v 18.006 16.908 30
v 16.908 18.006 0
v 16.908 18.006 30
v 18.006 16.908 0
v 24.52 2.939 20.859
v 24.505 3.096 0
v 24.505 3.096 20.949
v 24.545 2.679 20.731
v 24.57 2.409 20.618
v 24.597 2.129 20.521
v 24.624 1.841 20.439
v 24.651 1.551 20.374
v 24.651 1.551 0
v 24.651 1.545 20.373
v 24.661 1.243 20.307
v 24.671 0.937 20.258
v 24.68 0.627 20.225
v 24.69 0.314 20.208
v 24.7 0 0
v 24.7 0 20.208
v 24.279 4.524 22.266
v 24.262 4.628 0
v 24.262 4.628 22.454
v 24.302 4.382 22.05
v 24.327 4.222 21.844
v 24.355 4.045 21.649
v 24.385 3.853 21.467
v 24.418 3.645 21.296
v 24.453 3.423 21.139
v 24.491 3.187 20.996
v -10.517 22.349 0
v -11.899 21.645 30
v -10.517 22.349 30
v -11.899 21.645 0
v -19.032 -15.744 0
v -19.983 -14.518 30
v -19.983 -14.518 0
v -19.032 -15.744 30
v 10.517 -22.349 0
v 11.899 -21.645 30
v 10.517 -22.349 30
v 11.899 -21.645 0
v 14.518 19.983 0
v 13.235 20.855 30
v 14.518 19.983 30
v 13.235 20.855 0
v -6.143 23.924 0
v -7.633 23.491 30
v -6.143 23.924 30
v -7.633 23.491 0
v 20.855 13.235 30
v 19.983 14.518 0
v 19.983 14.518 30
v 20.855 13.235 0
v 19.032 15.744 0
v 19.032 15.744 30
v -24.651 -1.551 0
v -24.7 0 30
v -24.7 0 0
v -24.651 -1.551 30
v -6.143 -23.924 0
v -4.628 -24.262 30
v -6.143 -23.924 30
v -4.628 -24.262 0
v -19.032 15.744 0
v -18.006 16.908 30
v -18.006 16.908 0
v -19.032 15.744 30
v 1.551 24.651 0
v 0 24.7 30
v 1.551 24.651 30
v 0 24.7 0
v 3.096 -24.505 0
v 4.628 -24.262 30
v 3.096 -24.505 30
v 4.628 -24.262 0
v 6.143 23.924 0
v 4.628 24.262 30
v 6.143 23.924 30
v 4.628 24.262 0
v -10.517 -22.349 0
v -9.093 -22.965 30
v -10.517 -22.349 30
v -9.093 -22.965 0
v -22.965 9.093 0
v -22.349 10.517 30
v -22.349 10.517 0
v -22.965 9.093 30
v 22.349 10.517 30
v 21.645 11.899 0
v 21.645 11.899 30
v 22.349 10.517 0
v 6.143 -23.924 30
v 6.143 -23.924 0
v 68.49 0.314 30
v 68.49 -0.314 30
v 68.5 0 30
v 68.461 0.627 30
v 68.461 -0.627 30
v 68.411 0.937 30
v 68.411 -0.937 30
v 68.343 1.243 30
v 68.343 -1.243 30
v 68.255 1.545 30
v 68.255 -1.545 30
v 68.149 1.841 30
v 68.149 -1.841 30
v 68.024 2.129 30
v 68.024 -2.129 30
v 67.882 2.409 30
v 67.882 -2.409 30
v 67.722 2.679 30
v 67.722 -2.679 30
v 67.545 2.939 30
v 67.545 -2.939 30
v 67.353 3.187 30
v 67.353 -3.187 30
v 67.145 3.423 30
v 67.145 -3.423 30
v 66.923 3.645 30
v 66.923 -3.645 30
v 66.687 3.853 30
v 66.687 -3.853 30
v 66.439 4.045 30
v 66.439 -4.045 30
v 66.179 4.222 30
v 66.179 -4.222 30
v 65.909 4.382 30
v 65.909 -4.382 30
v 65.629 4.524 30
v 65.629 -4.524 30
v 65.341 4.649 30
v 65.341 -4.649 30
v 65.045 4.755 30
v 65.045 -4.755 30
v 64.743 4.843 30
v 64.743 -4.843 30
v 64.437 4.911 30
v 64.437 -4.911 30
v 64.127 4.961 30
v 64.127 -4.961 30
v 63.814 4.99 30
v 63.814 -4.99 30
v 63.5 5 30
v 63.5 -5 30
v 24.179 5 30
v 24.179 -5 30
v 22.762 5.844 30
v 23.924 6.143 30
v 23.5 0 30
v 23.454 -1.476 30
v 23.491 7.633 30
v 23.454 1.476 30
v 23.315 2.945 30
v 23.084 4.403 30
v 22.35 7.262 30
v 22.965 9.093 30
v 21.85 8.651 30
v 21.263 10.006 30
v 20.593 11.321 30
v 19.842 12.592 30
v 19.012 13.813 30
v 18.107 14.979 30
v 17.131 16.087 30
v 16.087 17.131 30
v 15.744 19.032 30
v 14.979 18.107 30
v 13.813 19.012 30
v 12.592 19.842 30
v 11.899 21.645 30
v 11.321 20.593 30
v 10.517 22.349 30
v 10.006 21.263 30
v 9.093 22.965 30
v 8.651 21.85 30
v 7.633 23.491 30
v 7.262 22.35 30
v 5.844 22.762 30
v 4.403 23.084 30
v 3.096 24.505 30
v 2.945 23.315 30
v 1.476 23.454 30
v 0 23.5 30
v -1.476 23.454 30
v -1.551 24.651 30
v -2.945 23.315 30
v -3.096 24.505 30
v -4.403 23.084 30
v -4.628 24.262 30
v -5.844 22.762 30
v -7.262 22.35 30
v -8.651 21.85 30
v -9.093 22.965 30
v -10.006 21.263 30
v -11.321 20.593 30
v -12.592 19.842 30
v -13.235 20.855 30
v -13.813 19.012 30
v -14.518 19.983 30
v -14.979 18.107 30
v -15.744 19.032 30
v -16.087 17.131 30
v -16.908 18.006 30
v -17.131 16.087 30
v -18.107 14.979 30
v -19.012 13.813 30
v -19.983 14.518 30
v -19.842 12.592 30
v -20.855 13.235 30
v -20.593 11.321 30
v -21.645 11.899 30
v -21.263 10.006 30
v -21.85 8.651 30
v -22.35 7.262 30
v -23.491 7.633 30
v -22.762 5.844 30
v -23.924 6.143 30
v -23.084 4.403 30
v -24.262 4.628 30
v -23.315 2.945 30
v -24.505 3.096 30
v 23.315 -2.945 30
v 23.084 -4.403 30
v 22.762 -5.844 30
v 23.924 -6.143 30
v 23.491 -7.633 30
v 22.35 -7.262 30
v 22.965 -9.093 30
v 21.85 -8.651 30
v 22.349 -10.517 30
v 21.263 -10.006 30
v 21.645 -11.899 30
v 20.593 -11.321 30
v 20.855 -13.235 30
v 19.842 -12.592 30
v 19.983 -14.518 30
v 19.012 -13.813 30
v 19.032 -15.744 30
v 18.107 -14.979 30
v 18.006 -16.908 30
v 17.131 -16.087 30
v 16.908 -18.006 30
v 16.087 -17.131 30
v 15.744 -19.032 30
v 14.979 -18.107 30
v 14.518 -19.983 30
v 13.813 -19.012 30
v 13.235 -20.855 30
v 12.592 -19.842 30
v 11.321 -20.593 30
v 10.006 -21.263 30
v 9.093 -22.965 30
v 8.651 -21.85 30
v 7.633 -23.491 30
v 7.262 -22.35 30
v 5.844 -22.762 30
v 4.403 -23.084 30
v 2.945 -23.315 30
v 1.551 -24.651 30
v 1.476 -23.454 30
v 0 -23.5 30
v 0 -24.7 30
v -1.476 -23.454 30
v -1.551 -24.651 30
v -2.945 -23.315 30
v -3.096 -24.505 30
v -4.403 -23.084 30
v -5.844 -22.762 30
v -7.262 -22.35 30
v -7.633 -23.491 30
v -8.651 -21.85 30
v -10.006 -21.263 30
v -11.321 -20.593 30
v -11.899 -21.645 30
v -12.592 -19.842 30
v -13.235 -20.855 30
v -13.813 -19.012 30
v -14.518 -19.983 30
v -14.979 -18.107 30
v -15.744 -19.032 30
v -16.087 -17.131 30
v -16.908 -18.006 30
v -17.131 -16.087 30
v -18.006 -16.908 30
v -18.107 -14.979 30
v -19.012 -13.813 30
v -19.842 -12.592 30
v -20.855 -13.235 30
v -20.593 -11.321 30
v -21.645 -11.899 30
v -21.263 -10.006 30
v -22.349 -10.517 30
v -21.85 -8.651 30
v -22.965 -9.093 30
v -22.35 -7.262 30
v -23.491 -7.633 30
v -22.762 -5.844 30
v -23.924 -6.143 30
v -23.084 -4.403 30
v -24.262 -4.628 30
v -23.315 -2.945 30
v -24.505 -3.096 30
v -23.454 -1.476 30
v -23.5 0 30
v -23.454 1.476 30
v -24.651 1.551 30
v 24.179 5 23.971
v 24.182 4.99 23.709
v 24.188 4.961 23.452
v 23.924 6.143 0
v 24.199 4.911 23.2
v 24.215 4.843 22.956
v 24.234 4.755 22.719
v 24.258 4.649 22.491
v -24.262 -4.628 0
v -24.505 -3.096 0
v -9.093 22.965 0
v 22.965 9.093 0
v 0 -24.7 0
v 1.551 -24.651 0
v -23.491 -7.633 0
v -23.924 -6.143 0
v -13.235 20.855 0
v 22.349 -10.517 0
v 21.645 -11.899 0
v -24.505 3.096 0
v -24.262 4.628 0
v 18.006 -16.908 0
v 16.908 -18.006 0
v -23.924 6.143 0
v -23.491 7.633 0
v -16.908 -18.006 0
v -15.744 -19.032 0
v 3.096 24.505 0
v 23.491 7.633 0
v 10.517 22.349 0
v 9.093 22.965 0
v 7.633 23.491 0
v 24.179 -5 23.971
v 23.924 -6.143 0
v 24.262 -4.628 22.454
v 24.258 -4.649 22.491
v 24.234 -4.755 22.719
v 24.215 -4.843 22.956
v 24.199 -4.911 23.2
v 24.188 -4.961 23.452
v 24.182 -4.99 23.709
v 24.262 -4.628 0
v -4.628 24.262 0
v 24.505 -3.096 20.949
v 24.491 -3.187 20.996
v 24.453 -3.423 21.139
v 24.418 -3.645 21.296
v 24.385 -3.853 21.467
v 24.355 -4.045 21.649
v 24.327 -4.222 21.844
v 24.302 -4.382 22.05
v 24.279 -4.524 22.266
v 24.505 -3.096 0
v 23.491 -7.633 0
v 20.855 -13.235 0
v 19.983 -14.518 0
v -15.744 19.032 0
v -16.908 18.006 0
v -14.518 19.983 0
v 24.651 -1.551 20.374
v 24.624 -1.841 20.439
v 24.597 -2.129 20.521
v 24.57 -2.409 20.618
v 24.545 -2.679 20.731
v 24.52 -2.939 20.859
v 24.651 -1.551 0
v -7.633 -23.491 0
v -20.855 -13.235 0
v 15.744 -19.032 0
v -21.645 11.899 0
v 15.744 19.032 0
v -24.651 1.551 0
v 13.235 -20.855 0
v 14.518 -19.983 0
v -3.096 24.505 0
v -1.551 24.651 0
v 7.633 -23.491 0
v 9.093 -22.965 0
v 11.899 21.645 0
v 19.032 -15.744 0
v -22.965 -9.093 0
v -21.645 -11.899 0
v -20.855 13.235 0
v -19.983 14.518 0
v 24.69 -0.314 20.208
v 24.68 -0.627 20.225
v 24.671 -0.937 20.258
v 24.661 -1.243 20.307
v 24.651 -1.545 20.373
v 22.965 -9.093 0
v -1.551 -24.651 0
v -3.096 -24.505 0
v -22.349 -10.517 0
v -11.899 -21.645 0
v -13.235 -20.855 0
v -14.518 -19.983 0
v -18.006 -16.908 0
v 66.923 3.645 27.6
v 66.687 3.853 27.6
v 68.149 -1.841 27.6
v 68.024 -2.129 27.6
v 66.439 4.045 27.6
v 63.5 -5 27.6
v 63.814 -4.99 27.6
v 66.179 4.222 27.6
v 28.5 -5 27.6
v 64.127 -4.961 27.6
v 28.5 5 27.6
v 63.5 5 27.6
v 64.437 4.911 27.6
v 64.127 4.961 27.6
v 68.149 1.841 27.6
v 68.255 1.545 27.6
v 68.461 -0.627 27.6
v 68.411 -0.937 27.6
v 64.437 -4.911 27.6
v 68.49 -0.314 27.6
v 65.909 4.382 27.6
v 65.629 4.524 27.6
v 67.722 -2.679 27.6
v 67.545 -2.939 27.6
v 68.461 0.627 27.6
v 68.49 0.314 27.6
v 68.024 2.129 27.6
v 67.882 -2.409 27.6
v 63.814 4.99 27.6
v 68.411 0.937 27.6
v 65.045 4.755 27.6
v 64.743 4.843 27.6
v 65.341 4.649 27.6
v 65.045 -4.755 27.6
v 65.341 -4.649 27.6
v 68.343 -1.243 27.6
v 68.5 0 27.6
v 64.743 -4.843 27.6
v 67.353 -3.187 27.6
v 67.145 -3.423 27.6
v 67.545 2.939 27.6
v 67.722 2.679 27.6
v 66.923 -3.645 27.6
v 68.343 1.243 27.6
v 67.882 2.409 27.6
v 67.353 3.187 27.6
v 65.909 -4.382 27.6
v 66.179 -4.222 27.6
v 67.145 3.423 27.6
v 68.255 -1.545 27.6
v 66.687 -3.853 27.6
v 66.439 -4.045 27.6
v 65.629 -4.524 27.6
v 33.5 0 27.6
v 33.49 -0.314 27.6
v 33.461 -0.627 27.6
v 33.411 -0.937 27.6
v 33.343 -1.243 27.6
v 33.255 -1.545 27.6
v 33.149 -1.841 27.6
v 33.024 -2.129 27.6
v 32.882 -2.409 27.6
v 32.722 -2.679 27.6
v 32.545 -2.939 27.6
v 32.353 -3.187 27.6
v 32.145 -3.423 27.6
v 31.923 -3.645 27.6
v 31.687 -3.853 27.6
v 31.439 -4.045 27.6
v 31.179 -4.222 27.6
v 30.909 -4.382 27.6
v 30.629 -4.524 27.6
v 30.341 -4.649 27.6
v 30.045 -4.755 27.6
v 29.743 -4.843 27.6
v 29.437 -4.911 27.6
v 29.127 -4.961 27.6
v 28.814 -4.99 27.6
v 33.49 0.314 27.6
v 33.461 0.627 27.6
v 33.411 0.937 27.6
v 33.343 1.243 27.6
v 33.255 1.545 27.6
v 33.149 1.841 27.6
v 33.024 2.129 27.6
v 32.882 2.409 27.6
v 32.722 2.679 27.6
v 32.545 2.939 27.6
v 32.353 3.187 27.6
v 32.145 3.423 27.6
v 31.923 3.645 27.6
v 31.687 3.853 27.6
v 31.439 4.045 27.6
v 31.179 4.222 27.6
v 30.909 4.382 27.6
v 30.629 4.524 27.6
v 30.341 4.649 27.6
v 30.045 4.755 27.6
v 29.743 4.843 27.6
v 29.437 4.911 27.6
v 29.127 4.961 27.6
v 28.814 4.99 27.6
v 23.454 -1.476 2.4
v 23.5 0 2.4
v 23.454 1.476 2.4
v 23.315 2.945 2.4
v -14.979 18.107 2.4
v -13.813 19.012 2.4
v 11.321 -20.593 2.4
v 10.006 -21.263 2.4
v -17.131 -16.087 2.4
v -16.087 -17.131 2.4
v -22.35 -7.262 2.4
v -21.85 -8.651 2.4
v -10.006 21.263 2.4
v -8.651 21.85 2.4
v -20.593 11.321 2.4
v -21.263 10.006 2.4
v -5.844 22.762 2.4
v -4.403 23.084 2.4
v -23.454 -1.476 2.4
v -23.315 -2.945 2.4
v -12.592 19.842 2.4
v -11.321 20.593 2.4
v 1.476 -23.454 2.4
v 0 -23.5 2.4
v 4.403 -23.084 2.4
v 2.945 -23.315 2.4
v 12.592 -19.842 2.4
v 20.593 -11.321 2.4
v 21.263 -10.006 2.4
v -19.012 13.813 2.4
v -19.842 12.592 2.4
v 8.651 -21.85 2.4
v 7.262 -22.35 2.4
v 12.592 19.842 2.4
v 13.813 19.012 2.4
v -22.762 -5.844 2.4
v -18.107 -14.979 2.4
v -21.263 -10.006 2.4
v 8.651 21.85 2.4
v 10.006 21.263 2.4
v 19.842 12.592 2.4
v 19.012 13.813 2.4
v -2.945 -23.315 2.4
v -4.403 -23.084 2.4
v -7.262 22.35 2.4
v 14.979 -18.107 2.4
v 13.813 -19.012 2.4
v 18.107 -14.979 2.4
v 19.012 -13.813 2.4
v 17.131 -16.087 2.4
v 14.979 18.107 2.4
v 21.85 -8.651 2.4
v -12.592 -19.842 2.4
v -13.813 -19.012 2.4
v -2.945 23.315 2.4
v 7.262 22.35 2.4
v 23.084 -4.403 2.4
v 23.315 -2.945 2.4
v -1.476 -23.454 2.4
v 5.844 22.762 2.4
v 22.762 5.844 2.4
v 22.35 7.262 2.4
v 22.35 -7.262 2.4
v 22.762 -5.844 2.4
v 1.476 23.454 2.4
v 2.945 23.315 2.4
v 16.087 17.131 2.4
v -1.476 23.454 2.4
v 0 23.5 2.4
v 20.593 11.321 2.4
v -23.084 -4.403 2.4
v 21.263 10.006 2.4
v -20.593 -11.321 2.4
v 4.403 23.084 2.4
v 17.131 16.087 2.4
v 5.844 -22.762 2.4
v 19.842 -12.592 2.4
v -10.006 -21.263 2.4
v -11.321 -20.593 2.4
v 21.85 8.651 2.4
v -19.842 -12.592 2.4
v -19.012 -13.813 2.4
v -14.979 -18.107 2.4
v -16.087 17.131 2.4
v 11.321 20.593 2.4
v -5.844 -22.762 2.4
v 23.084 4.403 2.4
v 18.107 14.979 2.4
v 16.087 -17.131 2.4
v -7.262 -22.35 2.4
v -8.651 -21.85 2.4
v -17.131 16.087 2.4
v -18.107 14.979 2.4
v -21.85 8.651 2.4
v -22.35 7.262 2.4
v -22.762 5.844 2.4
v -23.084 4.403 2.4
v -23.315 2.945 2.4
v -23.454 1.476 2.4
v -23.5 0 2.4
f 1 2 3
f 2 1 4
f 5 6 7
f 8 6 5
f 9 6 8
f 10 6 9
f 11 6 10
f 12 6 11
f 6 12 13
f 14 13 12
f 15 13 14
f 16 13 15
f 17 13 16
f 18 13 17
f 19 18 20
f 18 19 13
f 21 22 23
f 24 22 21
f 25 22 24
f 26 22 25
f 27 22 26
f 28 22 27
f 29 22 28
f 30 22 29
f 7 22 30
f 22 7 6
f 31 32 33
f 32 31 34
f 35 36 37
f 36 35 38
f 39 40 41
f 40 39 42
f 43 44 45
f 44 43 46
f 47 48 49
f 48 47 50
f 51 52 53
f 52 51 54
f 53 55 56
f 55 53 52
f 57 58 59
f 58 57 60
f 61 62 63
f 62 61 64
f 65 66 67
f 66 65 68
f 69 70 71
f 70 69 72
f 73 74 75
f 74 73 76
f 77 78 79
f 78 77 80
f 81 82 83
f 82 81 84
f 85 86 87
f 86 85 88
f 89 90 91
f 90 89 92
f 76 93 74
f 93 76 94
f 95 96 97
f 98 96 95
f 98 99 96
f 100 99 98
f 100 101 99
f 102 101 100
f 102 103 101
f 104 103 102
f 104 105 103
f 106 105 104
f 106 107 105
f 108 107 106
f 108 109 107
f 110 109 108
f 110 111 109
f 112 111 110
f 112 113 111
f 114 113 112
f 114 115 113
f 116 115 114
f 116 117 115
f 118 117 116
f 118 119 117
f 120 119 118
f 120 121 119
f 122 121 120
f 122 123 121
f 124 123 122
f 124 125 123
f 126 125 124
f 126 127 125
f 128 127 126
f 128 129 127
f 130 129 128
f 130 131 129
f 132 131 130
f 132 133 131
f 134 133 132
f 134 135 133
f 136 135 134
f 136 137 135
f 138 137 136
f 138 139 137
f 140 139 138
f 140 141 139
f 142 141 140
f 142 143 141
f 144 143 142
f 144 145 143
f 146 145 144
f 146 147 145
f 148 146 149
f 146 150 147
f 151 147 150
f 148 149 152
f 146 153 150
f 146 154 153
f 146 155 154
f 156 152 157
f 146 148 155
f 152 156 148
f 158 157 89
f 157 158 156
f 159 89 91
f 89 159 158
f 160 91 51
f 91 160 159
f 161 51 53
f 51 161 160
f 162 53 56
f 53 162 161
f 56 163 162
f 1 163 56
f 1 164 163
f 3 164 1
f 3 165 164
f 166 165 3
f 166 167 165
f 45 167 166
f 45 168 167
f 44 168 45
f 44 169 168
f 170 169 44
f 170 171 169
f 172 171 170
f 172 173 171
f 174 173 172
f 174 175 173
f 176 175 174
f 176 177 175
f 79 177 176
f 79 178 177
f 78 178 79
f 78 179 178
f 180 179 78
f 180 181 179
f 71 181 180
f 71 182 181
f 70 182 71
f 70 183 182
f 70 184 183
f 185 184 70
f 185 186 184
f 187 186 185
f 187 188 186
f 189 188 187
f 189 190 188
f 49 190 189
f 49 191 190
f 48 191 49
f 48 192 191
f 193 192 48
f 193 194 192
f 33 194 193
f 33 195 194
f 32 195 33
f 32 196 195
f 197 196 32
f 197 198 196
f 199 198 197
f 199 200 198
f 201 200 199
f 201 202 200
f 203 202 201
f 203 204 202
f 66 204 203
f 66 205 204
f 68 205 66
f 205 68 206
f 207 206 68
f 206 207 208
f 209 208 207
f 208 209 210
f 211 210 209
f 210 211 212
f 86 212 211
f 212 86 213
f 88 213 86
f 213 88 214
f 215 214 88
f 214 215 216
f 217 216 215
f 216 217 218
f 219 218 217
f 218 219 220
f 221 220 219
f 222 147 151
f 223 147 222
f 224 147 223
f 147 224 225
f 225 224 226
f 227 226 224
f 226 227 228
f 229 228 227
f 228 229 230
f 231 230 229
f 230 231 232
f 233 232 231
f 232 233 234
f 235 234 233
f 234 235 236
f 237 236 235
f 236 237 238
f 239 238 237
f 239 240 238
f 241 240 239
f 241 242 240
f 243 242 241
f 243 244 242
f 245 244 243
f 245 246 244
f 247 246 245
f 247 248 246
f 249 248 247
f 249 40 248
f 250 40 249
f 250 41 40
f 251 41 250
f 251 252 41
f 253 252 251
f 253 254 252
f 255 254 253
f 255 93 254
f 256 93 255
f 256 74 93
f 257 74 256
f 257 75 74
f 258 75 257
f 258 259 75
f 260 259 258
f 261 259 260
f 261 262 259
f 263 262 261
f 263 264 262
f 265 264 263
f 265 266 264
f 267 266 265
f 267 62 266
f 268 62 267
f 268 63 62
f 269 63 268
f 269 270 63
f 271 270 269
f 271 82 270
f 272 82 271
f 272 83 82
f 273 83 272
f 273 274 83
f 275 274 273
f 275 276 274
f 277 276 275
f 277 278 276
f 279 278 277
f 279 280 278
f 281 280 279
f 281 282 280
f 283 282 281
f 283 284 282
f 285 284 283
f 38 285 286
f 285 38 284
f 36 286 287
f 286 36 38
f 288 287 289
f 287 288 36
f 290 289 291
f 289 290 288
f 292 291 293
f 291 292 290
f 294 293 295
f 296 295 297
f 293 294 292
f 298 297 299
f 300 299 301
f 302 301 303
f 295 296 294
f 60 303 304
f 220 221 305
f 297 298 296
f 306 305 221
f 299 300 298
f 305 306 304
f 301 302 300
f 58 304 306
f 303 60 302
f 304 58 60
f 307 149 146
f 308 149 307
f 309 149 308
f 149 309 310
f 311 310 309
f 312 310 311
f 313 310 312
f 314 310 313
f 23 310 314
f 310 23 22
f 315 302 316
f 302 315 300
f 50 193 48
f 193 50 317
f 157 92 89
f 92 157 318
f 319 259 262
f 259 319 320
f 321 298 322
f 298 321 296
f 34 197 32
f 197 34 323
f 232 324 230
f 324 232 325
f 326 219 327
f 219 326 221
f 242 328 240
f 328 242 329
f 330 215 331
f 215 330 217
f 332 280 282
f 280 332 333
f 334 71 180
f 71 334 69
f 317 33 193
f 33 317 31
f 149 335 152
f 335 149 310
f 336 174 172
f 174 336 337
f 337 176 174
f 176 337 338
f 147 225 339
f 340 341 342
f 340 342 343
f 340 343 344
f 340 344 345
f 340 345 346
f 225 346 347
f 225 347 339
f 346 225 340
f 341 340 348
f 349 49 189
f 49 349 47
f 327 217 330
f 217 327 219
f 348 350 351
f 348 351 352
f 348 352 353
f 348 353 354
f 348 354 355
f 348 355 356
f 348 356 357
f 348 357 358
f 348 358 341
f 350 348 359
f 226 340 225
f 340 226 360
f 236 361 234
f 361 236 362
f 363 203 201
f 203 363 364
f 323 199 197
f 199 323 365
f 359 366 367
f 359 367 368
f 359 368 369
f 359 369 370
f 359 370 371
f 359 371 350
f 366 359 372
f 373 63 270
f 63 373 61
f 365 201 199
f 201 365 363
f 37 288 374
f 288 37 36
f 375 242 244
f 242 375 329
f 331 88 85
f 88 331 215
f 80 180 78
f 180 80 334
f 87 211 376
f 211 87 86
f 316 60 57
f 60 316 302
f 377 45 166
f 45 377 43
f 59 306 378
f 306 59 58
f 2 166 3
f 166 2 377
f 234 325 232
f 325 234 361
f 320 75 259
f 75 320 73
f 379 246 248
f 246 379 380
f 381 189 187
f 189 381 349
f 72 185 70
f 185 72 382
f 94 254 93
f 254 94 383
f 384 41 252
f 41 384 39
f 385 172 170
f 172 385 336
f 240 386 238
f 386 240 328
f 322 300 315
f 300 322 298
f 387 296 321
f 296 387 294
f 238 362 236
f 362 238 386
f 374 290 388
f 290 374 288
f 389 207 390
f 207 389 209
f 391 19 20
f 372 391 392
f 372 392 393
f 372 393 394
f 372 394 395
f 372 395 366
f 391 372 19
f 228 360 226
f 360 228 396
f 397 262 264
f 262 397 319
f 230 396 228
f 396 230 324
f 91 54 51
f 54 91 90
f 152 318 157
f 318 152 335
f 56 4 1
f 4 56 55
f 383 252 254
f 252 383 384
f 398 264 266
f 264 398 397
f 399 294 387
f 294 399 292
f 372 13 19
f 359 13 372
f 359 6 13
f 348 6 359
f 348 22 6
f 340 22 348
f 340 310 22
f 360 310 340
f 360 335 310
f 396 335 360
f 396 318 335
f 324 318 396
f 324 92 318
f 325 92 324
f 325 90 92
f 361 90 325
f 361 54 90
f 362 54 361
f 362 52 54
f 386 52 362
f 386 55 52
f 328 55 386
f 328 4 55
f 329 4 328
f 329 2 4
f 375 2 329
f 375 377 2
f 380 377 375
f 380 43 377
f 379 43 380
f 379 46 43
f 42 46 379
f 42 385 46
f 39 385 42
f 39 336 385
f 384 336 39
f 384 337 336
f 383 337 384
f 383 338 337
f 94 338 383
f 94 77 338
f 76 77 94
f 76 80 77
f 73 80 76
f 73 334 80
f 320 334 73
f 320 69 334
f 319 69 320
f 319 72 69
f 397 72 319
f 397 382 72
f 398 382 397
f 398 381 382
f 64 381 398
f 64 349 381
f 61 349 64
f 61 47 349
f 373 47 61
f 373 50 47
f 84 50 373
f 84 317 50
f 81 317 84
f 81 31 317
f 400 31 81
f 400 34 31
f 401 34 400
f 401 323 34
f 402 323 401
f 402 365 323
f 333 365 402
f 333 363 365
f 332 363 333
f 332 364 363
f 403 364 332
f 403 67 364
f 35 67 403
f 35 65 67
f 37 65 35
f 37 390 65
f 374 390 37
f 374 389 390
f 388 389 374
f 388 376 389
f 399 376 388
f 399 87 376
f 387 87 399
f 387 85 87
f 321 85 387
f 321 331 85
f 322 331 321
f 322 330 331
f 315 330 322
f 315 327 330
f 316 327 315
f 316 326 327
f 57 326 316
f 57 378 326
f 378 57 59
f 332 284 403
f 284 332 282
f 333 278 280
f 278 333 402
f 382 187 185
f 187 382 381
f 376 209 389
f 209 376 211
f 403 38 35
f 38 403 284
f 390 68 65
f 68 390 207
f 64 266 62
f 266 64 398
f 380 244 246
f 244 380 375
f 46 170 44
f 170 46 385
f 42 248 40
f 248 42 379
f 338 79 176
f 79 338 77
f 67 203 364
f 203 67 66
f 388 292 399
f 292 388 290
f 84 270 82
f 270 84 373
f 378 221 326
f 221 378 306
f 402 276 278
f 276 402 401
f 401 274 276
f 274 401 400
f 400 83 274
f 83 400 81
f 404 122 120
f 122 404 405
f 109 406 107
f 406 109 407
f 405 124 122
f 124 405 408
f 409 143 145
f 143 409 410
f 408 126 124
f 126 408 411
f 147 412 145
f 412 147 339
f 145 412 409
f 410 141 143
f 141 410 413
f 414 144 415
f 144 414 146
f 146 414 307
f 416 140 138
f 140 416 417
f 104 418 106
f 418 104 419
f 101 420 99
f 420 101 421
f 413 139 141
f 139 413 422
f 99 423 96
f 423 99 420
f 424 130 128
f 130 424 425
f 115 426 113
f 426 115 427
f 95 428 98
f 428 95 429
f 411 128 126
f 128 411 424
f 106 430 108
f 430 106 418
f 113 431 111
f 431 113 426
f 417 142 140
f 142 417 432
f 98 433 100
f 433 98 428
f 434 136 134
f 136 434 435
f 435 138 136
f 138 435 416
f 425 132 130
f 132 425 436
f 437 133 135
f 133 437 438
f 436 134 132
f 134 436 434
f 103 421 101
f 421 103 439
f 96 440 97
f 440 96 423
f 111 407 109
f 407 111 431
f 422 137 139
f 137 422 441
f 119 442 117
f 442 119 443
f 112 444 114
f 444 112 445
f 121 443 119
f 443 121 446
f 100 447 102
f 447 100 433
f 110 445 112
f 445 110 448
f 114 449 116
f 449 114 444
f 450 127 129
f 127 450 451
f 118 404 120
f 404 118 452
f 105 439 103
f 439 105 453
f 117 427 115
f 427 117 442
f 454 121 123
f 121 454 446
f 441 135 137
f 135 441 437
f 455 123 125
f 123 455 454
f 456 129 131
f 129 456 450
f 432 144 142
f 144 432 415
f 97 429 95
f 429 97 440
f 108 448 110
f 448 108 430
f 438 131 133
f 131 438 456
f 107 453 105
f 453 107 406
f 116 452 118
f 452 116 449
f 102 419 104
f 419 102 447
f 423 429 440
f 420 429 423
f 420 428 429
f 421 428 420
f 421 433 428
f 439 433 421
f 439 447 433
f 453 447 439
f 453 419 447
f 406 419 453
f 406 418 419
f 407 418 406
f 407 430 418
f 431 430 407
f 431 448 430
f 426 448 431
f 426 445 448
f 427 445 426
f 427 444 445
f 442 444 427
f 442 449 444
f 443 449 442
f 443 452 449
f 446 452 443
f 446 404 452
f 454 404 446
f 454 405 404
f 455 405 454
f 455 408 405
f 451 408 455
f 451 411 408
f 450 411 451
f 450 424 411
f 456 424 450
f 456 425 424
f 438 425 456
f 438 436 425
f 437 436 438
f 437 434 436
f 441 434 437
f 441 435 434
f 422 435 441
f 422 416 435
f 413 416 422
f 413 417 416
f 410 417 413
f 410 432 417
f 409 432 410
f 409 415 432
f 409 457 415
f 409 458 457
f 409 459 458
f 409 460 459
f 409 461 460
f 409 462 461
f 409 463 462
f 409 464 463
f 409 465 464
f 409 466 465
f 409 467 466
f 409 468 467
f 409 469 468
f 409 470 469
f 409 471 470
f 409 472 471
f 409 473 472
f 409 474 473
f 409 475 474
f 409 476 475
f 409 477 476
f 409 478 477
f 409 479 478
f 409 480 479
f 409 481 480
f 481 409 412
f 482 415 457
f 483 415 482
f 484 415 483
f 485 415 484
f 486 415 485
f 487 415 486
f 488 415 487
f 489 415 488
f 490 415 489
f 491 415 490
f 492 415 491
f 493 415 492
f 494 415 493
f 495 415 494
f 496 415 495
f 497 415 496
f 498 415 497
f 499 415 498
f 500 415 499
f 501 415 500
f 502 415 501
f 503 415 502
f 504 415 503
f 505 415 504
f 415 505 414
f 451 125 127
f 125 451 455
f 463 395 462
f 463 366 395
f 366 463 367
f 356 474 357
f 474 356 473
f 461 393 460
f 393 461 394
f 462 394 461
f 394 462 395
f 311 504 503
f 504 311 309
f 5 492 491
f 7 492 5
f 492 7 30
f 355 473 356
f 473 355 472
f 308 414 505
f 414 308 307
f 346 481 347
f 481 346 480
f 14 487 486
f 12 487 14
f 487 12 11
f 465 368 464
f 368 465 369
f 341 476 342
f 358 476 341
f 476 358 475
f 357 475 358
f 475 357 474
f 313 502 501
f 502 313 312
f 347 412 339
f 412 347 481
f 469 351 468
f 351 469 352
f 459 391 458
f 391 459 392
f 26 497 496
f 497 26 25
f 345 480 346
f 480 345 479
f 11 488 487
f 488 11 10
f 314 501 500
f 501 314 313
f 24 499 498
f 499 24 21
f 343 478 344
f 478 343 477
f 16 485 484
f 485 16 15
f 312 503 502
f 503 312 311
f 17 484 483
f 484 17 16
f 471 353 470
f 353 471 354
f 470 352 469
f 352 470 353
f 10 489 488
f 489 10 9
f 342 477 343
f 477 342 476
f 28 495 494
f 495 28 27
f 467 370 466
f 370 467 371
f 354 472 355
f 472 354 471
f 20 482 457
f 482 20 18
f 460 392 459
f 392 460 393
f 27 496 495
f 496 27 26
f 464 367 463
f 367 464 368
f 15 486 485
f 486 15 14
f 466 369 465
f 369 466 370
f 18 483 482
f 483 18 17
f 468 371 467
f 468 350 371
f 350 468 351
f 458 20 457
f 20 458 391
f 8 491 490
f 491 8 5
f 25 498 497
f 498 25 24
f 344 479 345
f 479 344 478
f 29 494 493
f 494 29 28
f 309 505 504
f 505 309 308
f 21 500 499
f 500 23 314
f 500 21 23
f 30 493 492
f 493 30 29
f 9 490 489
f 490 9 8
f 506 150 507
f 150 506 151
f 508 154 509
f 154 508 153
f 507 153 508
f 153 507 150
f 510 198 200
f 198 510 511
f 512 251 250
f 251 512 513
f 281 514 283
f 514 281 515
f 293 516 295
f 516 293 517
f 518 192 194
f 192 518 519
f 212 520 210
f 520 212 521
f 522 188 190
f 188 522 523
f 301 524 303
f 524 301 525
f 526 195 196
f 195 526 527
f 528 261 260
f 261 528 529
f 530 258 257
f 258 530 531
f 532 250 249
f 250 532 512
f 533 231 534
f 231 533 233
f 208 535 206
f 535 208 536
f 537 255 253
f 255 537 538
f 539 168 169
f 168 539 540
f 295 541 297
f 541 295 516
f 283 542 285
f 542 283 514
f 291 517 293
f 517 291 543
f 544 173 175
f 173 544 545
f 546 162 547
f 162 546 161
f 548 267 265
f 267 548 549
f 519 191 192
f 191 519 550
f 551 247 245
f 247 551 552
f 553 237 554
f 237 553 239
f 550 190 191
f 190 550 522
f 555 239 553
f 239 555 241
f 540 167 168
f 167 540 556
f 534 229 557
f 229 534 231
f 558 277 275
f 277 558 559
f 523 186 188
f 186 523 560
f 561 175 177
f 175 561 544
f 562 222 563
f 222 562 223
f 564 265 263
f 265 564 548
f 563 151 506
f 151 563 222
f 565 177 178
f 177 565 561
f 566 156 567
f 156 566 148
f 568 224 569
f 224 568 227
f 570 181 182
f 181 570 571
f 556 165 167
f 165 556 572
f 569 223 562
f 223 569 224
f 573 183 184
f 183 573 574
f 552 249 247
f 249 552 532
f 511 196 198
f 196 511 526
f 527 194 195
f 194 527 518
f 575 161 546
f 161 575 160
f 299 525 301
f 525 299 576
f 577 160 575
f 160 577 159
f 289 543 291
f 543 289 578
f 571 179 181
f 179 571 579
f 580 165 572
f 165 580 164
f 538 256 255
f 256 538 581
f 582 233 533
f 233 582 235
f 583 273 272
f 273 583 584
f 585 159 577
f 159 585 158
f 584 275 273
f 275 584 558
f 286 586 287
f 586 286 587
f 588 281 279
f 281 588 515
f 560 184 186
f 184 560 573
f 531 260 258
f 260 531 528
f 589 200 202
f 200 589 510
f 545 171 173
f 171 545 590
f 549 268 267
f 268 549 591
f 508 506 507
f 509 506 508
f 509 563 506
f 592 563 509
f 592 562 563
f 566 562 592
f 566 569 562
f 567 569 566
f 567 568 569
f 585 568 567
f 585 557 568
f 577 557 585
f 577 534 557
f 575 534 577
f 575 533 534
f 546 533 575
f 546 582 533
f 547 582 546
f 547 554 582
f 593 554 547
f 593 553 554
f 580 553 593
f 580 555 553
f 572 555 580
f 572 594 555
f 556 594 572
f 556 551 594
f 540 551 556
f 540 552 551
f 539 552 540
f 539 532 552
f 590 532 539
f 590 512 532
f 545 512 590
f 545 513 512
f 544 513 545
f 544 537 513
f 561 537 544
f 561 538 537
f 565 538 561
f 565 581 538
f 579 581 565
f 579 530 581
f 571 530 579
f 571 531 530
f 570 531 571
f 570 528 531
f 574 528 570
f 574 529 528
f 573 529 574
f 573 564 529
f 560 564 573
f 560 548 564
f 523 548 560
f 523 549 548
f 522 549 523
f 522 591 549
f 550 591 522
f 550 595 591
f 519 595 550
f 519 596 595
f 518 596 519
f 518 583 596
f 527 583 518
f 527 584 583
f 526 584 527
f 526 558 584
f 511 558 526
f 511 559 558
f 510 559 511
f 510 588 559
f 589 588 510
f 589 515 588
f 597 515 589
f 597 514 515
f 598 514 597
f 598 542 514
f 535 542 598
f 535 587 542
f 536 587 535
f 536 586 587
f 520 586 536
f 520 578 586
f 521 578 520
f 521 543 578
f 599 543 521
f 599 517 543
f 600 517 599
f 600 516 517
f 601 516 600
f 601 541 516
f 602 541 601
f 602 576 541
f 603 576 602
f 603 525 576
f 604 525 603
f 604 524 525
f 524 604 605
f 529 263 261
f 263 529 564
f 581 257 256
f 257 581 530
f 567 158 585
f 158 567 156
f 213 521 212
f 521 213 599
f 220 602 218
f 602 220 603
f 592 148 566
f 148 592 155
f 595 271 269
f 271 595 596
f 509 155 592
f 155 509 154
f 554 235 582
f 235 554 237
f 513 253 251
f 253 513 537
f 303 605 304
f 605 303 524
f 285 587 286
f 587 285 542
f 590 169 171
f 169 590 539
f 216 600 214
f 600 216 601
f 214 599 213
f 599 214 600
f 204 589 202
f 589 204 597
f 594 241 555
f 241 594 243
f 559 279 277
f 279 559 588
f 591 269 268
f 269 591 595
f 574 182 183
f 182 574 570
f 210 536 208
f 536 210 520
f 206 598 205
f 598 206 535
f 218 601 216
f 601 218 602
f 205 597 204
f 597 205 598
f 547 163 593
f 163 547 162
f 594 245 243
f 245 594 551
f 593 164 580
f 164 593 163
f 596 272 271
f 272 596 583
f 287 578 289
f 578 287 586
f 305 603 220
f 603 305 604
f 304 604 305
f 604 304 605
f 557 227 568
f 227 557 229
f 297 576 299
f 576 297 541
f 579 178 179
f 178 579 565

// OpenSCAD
$fn=100;

h=30;
di=47;
t=1.2;
tb=t*2;
l=40;
w=10;


difference(){
    union(){
        cylinder(d=di+t*2, h=h);
        
        hull(){
            translate([0,0,h-tb])
            cylinder(d=w, h=tb);
            
            translate([di/2+l,0,h-tb])
            cylinder(d=w, h=tb);
        }
        
        // reforço
        hull(){
            translate([di/2-w,0,h/2])
            cylinder(d=w, h=h/2);
            
            translate([di/2+h/2-w,0,h-tb])
            cylinder(d=w, h=tb);
        }
    }

    translate([0,0,tb])
    cylinder(d=di, h=h);
}    
